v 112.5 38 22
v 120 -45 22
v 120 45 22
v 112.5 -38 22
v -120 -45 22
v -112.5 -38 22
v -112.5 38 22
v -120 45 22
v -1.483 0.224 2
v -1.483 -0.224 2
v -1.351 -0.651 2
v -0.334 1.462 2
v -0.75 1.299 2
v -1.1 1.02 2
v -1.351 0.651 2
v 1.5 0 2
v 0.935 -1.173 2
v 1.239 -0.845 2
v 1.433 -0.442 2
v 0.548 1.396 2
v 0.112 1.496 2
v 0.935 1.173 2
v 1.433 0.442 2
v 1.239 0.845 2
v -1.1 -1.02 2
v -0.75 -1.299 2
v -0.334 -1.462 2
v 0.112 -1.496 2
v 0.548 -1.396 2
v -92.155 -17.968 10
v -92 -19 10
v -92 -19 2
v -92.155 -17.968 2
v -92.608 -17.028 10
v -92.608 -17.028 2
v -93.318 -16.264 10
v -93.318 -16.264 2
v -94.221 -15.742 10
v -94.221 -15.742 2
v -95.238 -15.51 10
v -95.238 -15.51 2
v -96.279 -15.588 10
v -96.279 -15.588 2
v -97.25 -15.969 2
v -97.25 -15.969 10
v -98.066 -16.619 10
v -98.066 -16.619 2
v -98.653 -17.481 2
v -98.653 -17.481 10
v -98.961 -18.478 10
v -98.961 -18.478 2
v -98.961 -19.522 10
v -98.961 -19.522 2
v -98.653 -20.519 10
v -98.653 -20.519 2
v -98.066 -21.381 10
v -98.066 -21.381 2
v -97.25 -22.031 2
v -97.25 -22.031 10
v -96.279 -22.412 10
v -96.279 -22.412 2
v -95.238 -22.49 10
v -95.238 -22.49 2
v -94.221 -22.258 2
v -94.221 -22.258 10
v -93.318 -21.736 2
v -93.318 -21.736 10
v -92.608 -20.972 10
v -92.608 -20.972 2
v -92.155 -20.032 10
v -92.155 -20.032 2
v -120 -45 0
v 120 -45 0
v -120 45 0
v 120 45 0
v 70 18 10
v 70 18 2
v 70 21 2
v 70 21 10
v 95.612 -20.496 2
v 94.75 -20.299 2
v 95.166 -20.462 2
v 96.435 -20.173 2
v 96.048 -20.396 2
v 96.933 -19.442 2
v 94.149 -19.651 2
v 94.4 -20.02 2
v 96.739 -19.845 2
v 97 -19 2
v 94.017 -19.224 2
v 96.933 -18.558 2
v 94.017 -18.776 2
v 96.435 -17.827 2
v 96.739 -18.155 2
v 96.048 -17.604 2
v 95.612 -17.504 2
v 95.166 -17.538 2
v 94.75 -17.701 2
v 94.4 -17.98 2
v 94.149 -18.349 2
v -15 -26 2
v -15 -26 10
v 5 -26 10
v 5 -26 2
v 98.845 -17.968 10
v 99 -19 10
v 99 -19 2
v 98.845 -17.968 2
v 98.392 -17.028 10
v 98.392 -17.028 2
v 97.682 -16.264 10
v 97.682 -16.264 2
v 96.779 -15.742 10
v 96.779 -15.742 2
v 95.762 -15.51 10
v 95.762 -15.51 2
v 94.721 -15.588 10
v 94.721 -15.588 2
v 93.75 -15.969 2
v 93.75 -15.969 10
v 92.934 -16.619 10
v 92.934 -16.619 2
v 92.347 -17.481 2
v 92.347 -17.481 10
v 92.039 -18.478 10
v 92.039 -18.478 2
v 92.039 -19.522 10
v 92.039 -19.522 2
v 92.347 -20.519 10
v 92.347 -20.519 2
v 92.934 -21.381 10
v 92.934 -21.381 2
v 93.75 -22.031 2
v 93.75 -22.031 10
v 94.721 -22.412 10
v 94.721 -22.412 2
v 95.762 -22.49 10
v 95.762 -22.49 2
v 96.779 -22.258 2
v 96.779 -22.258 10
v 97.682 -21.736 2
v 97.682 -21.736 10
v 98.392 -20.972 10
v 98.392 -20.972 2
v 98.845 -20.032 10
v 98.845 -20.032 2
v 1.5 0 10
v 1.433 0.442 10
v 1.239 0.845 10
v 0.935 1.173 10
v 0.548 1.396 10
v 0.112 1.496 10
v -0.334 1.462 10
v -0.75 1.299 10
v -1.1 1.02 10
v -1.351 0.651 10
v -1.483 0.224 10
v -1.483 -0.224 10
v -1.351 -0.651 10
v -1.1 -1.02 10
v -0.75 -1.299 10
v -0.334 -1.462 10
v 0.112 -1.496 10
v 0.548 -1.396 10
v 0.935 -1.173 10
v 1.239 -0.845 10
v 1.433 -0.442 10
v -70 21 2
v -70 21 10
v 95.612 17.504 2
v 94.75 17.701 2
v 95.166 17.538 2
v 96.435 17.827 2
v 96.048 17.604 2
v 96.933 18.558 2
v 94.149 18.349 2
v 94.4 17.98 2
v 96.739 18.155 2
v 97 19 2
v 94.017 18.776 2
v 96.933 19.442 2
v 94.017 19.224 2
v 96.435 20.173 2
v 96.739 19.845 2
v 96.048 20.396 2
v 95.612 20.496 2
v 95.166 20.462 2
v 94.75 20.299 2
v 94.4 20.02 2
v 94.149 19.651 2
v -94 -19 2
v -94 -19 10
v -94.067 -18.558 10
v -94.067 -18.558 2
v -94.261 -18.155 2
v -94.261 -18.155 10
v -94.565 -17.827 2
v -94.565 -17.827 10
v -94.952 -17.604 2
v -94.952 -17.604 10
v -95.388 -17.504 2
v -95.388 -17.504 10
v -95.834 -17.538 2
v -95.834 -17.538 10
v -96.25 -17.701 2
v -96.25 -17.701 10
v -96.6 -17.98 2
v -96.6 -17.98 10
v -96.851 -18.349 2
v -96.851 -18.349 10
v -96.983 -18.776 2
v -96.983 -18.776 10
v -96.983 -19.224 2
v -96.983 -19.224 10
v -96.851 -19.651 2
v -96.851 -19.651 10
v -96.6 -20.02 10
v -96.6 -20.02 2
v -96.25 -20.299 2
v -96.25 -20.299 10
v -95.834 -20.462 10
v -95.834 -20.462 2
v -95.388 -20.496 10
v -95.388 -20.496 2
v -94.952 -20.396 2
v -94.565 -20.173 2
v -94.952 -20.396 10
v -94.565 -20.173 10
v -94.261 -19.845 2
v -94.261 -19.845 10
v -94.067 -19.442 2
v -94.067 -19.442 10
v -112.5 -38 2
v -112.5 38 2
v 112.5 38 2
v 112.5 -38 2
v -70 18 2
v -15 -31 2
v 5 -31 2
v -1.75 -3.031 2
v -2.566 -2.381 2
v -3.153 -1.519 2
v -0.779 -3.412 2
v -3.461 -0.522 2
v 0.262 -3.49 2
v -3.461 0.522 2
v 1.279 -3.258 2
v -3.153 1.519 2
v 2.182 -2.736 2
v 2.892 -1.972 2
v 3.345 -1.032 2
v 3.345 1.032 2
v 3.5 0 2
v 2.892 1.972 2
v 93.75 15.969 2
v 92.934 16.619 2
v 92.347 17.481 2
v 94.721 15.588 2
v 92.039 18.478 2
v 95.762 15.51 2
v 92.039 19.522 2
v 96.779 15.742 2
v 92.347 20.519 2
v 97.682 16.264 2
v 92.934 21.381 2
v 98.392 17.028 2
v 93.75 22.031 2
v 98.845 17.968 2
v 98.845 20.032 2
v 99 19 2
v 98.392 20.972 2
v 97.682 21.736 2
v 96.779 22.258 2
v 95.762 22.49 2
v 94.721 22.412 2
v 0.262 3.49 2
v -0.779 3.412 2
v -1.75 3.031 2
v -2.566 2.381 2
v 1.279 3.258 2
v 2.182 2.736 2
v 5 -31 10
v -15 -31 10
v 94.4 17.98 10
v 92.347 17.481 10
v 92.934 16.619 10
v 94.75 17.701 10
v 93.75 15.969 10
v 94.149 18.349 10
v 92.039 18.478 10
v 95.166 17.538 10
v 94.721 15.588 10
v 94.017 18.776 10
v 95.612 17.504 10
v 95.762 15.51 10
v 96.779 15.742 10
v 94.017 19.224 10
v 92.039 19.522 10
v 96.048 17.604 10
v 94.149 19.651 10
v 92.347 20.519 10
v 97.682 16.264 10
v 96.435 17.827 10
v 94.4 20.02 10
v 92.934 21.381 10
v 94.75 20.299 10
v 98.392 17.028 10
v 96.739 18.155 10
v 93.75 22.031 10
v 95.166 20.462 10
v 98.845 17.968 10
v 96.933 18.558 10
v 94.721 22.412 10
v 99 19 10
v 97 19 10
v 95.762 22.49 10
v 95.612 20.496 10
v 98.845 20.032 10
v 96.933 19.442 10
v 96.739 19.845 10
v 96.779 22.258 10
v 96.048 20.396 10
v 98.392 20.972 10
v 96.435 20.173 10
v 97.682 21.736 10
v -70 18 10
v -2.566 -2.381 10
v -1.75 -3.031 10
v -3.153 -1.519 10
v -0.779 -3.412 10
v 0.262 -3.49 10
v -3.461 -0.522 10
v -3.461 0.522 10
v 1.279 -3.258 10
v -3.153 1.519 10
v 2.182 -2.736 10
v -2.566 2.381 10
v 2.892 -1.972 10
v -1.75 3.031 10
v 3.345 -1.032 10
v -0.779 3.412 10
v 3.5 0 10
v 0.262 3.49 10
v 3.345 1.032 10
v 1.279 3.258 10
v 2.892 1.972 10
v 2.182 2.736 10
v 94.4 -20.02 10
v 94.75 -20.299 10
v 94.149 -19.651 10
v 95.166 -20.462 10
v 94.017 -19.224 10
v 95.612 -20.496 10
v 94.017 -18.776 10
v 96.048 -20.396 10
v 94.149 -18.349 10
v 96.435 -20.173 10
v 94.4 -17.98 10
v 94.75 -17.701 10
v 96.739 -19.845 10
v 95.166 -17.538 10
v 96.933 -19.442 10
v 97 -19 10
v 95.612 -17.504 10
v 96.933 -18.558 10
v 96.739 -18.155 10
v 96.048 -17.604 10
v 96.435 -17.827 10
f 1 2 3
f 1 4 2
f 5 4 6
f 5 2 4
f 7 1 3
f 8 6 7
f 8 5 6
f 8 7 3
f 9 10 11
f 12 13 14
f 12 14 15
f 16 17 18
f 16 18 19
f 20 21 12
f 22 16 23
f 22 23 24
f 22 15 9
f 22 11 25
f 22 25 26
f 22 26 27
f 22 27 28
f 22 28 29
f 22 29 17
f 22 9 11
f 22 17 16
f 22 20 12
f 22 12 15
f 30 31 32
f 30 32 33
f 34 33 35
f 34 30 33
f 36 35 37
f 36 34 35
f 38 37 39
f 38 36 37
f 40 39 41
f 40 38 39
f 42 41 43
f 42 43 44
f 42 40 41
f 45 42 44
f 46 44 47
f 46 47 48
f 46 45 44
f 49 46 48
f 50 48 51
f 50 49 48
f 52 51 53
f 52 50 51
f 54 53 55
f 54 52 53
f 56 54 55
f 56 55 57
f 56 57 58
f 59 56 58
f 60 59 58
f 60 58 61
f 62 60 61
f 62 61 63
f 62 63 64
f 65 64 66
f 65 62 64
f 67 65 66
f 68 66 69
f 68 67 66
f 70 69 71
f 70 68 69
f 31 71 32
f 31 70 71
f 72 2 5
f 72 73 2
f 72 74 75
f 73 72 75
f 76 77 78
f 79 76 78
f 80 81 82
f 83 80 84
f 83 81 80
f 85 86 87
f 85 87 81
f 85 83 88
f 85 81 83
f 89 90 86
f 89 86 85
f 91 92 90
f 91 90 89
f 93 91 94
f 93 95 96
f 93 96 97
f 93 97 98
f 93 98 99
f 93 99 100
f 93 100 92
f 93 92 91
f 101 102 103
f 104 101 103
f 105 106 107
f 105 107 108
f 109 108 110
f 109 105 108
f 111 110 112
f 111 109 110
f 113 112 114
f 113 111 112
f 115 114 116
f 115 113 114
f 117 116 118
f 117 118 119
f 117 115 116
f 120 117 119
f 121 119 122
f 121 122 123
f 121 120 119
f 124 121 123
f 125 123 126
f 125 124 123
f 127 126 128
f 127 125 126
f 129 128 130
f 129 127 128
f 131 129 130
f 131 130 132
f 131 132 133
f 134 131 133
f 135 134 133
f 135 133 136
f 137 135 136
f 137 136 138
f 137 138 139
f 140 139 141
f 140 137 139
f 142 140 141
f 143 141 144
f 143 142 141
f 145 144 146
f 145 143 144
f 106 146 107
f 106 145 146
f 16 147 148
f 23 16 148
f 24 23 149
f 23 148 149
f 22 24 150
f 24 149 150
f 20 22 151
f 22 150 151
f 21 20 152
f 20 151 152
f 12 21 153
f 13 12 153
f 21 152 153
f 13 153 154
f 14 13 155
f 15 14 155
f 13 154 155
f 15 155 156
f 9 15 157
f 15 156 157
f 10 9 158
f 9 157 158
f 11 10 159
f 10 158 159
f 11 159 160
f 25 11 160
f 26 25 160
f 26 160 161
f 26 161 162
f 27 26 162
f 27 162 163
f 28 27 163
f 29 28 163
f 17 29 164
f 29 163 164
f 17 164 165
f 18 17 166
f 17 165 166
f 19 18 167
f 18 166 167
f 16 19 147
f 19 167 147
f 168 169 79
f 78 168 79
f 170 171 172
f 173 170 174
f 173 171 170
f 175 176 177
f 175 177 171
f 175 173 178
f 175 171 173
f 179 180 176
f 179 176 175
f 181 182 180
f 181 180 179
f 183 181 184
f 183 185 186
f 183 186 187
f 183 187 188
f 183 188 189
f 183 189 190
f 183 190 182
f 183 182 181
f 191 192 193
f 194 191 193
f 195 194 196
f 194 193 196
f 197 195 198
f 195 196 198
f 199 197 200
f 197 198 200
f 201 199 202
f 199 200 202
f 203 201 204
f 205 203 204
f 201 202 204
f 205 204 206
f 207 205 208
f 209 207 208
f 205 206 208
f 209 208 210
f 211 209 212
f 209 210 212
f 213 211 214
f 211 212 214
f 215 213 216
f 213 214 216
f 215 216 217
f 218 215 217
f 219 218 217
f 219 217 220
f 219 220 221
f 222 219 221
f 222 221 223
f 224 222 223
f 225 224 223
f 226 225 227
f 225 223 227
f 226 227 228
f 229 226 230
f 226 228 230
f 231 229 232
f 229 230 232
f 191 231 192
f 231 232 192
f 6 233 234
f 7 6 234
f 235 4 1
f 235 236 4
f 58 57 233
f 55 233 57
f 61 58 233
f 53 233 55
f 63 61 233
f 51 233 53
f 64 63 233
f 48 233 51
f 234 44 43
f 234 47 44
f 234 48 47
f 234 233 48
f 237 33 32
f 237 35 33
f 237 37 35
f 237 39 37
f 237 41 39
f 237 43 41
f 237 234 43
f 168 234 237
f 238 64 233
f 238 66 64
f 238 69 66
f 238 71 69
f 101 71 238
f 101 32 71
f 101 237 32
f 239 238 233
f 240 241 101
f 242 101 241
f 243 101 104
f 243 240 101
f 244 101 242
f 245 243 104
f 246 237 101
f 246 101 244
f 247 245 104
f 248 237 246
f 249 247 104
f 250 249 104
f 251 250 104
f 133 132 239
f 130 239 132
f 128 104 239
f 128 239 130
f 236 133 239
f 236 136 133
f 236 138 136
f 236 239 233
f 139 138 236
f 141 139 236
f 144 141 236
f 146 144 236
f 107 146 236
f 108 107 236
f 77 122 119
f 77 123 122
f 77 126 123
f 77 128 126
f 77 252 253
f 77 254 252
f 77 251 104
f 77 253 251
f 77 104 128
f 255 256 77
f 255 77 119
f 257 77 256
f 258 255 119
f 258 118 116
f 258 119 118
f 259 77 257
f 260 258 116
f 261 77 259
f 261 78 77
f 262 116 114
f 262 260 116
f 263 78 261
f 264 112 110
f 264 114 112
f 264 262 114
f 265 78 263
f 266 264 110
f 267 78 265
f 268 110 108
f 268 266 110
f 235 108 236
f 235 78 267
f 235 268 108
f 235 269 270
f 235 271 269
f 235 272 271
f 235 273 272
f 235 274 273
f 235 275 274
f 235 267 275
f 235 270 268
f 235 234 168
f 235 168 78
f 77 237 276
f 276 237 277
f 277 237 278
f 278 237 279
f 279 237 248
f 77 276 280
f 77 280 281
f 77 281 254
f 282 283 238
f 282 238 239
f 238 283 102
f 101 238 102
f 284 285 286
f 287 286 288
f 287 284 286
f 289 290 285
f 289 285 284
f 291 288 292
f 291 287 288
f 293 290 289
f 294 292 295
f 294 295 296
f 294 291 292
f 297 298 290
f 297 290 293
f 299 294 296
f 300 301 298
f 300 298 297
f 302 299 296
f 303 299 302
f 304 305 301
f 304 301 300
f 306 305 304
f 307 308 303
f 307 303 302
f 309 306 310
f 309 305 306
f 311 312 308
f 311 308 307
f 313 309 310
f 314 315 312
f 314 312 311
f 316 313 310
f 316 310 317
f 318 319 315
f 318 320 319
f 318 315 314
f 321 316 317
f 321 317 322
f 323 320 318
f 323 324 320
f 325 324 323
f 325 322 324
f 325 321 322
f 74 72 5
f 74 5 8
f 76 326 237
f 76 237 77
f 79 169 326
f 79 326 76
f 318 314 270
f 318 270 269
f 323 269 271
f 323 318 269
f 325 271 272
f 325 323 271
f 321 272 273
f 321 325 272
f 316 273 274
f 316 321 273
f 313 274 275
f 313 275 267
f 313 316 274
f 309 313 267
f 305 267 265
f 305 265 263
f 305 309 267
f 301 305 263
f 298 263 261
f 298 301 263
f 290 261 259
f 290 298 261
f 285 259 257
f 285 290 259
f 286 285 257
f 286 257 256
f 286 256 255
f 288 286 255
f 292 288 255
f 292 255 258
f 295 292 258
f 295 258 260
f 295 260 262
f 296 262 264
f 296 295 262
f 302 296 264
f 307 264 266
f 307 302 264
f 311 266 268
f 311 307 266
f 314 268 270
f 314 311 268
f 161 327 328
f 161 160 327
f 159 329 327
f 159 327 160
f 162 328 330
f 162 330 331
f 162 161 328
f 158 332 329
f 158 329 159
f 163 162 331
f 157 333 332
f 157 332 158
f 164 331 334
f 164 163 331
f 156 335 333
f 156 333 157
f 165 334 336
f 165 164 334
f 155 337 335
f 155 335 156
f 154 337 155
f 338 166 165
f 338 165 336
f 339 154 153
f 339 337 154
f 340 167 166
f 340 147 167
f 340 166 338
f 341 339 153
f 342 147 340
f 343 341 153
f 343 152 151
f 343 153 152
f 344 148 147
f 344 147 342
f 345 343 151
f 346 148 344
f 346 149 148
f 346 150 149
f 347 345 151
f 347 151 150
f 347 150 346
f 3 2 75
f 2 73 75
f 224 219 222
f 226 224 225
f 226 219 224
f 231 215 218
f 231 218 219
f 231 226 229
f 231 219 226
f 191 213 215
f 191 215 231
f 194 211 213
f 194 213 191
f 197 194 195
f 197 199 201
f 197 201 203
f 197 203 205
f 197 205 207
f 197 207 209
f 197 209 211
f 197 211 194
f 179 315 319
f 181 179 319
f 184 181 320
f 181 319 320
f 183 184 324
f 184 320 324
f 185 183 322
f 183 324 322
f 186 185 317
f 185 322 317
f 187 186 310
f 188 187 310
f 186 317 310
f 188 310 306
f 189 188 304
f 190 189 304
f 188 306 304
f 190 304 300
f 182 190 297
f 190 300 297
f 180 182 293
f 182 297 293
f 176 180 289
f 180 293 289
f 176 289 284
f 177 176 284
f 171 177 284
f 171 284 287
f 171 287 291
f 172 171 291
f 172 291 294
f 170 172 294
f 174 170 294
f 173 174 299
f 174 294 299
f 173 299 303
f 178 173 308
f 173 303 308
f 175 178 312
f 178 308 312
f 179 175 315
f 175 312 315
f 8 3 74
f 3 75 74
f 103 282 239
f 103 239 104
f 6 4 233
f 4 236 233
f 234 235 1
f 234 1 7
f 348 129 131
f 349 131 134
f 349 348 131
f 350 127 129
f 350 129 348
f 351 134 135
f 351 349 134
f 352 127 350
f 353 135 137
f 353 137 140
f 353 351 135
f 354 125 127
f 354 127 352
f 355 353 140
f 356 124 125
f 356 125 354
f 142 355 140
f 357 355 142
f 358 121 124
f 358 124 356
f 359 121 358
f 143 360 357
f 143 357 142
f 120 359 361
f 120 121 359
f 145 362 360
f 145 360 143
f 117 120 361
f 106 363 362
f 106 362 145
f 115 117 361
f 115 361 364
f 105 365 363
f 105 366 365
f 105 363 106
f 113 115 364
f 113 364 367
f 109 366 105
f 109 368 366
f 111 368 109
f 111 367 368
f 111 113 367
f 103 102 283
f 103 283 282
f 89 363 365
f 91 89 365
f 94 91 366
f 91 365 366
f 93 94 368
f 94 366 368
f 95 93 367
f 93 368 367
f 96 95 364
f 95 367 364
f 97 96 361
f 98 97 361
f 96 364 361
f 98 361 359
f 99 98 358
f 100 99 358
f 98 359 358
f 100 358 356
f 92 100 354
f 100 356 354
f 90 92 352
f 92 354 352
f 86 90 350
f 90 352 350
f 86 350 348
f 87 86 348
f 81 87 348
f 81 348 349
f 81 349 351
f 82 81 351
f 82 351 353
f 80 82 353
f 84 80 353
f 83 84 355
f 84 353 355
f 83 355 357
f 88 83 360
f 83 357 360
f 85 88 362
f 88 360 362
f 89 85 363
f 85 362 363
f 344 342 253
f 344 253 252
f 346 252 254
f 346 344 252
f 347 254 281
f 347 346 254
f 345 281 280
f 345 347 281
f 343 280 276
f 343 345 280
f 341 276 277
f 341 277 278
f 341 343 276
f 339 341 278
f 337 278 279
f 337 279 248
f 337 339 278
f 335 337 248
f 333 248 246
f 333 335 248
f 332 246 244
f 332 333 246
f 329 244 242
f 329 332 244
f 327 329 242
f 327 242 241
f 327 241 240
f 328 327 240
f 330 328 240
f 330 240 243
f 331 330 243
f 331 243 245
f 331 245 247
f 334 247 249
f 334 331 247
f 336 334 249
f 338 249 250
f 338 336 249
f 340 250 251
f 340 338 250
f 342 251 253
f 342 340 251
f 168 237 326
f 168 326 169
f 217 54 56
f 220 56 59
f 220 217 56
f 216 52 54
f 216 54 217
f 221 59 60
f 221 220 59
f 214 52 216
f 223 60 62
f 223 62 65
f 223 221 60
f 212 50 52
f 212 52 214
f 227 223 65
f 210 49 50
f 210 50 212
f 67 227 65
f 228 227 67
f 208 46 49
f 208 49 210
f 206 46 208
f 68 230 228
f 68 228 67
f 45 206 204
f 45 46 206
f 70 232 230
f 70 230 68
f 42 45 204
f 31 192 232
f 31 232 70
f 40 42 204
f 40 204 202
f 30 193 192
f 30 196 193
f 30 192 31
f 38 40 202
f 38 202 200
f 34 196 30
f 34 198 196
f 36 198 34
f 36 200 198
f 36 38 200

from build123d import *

# Parameters (mm, degrees)
SKETCH_W         = 240
SKETCH_H         = 90
PAD_DEPTH        = 10
SKETCH001_W      = 225
SKETCH001_H      = 76
SKETCH001_R      = 3.5
SKETCH001_W_2    = 140
SKETCH001_H_2    = 3
SKETCH001_W_3    = 20
SKETCH001_H_3    = 5
SKETCH001_R_2    = 1.5
POCKET_DEPTH     = 8
POCKET_FACE5_W   = 90
POCKET_FACE5_H   = 240
POCKET_FACE5_W_2 = 76
POCKET_FACE5_H_2 = 225
PAD001_DEPTH     = 12


with BuildPart() as part:
    # Sketch → Pad (new body)
    with BuildSketch(Plane.XY):
        Rectangle(SKETCH_W, SKETCH_H)
    extrude(amount=PAD_DEPTH)

    # Sketch001 (on Face6 of Pad) → Pocket (cut)
    with BuildSketch(Plane.XY.offset(10)):
        Rectangle(SKETCH001_W, SKETCH001_H)
        Circle(SKETCH001_R, mode=Mode.SUBTRACT)
        with Locations((-95.5, -19)):
            Circle(SKETCH001_R, mode=Mode.SUBTRACT)
        with Locations((95.5, 19)):
            Circle(SKETCH001_R, mode=Mode.SUBTRACT)
        with Locations((95.5, -19)):
            Circle(SKETCH001_R, mode=Mode.SUBTRACT)
        with Locations((0, 19.5)):
            Rectangle(SKETCH001_W_2, SKETCH001_H_2, mode=Mode.SUBTRACT)
        with Locations((-5, -28.5)):
            Rectangle(SKETCH001_W_3, SKETCH001_H_3, mode=Mode.SUBTRACT)
        with Locations((-95.5, -19)):
            Circle(SKETCH001_R_2)
        with Locations((95.5, 19)):
            Circle(SKETCH001_R_2)
        with Locations((95.5, -19)):
            Circle(SKETCH001_R_2)
        Circle(SKETCH001_R_2)
    extrude(amount=-POCKET_DEPTH, mode=Mode.SUBTRACT)

    # Pocket Face5 → Pad001 (add)
    with BuildSketch(Plane(origin=(0, 0, 10), x_dir=(0, 1, 0), z_dir=(0, 0, 1))):
        Rectangle(POCKET_FACE5_W, POCKET_FACE5_H)
        Rectangle(POCKET_FACE5_W_2, POCKET_FACE5_H_2, mode=Mode.SUBTRACT)
    extrude(amount=PAD001_DEPTH)


solid = part.part
